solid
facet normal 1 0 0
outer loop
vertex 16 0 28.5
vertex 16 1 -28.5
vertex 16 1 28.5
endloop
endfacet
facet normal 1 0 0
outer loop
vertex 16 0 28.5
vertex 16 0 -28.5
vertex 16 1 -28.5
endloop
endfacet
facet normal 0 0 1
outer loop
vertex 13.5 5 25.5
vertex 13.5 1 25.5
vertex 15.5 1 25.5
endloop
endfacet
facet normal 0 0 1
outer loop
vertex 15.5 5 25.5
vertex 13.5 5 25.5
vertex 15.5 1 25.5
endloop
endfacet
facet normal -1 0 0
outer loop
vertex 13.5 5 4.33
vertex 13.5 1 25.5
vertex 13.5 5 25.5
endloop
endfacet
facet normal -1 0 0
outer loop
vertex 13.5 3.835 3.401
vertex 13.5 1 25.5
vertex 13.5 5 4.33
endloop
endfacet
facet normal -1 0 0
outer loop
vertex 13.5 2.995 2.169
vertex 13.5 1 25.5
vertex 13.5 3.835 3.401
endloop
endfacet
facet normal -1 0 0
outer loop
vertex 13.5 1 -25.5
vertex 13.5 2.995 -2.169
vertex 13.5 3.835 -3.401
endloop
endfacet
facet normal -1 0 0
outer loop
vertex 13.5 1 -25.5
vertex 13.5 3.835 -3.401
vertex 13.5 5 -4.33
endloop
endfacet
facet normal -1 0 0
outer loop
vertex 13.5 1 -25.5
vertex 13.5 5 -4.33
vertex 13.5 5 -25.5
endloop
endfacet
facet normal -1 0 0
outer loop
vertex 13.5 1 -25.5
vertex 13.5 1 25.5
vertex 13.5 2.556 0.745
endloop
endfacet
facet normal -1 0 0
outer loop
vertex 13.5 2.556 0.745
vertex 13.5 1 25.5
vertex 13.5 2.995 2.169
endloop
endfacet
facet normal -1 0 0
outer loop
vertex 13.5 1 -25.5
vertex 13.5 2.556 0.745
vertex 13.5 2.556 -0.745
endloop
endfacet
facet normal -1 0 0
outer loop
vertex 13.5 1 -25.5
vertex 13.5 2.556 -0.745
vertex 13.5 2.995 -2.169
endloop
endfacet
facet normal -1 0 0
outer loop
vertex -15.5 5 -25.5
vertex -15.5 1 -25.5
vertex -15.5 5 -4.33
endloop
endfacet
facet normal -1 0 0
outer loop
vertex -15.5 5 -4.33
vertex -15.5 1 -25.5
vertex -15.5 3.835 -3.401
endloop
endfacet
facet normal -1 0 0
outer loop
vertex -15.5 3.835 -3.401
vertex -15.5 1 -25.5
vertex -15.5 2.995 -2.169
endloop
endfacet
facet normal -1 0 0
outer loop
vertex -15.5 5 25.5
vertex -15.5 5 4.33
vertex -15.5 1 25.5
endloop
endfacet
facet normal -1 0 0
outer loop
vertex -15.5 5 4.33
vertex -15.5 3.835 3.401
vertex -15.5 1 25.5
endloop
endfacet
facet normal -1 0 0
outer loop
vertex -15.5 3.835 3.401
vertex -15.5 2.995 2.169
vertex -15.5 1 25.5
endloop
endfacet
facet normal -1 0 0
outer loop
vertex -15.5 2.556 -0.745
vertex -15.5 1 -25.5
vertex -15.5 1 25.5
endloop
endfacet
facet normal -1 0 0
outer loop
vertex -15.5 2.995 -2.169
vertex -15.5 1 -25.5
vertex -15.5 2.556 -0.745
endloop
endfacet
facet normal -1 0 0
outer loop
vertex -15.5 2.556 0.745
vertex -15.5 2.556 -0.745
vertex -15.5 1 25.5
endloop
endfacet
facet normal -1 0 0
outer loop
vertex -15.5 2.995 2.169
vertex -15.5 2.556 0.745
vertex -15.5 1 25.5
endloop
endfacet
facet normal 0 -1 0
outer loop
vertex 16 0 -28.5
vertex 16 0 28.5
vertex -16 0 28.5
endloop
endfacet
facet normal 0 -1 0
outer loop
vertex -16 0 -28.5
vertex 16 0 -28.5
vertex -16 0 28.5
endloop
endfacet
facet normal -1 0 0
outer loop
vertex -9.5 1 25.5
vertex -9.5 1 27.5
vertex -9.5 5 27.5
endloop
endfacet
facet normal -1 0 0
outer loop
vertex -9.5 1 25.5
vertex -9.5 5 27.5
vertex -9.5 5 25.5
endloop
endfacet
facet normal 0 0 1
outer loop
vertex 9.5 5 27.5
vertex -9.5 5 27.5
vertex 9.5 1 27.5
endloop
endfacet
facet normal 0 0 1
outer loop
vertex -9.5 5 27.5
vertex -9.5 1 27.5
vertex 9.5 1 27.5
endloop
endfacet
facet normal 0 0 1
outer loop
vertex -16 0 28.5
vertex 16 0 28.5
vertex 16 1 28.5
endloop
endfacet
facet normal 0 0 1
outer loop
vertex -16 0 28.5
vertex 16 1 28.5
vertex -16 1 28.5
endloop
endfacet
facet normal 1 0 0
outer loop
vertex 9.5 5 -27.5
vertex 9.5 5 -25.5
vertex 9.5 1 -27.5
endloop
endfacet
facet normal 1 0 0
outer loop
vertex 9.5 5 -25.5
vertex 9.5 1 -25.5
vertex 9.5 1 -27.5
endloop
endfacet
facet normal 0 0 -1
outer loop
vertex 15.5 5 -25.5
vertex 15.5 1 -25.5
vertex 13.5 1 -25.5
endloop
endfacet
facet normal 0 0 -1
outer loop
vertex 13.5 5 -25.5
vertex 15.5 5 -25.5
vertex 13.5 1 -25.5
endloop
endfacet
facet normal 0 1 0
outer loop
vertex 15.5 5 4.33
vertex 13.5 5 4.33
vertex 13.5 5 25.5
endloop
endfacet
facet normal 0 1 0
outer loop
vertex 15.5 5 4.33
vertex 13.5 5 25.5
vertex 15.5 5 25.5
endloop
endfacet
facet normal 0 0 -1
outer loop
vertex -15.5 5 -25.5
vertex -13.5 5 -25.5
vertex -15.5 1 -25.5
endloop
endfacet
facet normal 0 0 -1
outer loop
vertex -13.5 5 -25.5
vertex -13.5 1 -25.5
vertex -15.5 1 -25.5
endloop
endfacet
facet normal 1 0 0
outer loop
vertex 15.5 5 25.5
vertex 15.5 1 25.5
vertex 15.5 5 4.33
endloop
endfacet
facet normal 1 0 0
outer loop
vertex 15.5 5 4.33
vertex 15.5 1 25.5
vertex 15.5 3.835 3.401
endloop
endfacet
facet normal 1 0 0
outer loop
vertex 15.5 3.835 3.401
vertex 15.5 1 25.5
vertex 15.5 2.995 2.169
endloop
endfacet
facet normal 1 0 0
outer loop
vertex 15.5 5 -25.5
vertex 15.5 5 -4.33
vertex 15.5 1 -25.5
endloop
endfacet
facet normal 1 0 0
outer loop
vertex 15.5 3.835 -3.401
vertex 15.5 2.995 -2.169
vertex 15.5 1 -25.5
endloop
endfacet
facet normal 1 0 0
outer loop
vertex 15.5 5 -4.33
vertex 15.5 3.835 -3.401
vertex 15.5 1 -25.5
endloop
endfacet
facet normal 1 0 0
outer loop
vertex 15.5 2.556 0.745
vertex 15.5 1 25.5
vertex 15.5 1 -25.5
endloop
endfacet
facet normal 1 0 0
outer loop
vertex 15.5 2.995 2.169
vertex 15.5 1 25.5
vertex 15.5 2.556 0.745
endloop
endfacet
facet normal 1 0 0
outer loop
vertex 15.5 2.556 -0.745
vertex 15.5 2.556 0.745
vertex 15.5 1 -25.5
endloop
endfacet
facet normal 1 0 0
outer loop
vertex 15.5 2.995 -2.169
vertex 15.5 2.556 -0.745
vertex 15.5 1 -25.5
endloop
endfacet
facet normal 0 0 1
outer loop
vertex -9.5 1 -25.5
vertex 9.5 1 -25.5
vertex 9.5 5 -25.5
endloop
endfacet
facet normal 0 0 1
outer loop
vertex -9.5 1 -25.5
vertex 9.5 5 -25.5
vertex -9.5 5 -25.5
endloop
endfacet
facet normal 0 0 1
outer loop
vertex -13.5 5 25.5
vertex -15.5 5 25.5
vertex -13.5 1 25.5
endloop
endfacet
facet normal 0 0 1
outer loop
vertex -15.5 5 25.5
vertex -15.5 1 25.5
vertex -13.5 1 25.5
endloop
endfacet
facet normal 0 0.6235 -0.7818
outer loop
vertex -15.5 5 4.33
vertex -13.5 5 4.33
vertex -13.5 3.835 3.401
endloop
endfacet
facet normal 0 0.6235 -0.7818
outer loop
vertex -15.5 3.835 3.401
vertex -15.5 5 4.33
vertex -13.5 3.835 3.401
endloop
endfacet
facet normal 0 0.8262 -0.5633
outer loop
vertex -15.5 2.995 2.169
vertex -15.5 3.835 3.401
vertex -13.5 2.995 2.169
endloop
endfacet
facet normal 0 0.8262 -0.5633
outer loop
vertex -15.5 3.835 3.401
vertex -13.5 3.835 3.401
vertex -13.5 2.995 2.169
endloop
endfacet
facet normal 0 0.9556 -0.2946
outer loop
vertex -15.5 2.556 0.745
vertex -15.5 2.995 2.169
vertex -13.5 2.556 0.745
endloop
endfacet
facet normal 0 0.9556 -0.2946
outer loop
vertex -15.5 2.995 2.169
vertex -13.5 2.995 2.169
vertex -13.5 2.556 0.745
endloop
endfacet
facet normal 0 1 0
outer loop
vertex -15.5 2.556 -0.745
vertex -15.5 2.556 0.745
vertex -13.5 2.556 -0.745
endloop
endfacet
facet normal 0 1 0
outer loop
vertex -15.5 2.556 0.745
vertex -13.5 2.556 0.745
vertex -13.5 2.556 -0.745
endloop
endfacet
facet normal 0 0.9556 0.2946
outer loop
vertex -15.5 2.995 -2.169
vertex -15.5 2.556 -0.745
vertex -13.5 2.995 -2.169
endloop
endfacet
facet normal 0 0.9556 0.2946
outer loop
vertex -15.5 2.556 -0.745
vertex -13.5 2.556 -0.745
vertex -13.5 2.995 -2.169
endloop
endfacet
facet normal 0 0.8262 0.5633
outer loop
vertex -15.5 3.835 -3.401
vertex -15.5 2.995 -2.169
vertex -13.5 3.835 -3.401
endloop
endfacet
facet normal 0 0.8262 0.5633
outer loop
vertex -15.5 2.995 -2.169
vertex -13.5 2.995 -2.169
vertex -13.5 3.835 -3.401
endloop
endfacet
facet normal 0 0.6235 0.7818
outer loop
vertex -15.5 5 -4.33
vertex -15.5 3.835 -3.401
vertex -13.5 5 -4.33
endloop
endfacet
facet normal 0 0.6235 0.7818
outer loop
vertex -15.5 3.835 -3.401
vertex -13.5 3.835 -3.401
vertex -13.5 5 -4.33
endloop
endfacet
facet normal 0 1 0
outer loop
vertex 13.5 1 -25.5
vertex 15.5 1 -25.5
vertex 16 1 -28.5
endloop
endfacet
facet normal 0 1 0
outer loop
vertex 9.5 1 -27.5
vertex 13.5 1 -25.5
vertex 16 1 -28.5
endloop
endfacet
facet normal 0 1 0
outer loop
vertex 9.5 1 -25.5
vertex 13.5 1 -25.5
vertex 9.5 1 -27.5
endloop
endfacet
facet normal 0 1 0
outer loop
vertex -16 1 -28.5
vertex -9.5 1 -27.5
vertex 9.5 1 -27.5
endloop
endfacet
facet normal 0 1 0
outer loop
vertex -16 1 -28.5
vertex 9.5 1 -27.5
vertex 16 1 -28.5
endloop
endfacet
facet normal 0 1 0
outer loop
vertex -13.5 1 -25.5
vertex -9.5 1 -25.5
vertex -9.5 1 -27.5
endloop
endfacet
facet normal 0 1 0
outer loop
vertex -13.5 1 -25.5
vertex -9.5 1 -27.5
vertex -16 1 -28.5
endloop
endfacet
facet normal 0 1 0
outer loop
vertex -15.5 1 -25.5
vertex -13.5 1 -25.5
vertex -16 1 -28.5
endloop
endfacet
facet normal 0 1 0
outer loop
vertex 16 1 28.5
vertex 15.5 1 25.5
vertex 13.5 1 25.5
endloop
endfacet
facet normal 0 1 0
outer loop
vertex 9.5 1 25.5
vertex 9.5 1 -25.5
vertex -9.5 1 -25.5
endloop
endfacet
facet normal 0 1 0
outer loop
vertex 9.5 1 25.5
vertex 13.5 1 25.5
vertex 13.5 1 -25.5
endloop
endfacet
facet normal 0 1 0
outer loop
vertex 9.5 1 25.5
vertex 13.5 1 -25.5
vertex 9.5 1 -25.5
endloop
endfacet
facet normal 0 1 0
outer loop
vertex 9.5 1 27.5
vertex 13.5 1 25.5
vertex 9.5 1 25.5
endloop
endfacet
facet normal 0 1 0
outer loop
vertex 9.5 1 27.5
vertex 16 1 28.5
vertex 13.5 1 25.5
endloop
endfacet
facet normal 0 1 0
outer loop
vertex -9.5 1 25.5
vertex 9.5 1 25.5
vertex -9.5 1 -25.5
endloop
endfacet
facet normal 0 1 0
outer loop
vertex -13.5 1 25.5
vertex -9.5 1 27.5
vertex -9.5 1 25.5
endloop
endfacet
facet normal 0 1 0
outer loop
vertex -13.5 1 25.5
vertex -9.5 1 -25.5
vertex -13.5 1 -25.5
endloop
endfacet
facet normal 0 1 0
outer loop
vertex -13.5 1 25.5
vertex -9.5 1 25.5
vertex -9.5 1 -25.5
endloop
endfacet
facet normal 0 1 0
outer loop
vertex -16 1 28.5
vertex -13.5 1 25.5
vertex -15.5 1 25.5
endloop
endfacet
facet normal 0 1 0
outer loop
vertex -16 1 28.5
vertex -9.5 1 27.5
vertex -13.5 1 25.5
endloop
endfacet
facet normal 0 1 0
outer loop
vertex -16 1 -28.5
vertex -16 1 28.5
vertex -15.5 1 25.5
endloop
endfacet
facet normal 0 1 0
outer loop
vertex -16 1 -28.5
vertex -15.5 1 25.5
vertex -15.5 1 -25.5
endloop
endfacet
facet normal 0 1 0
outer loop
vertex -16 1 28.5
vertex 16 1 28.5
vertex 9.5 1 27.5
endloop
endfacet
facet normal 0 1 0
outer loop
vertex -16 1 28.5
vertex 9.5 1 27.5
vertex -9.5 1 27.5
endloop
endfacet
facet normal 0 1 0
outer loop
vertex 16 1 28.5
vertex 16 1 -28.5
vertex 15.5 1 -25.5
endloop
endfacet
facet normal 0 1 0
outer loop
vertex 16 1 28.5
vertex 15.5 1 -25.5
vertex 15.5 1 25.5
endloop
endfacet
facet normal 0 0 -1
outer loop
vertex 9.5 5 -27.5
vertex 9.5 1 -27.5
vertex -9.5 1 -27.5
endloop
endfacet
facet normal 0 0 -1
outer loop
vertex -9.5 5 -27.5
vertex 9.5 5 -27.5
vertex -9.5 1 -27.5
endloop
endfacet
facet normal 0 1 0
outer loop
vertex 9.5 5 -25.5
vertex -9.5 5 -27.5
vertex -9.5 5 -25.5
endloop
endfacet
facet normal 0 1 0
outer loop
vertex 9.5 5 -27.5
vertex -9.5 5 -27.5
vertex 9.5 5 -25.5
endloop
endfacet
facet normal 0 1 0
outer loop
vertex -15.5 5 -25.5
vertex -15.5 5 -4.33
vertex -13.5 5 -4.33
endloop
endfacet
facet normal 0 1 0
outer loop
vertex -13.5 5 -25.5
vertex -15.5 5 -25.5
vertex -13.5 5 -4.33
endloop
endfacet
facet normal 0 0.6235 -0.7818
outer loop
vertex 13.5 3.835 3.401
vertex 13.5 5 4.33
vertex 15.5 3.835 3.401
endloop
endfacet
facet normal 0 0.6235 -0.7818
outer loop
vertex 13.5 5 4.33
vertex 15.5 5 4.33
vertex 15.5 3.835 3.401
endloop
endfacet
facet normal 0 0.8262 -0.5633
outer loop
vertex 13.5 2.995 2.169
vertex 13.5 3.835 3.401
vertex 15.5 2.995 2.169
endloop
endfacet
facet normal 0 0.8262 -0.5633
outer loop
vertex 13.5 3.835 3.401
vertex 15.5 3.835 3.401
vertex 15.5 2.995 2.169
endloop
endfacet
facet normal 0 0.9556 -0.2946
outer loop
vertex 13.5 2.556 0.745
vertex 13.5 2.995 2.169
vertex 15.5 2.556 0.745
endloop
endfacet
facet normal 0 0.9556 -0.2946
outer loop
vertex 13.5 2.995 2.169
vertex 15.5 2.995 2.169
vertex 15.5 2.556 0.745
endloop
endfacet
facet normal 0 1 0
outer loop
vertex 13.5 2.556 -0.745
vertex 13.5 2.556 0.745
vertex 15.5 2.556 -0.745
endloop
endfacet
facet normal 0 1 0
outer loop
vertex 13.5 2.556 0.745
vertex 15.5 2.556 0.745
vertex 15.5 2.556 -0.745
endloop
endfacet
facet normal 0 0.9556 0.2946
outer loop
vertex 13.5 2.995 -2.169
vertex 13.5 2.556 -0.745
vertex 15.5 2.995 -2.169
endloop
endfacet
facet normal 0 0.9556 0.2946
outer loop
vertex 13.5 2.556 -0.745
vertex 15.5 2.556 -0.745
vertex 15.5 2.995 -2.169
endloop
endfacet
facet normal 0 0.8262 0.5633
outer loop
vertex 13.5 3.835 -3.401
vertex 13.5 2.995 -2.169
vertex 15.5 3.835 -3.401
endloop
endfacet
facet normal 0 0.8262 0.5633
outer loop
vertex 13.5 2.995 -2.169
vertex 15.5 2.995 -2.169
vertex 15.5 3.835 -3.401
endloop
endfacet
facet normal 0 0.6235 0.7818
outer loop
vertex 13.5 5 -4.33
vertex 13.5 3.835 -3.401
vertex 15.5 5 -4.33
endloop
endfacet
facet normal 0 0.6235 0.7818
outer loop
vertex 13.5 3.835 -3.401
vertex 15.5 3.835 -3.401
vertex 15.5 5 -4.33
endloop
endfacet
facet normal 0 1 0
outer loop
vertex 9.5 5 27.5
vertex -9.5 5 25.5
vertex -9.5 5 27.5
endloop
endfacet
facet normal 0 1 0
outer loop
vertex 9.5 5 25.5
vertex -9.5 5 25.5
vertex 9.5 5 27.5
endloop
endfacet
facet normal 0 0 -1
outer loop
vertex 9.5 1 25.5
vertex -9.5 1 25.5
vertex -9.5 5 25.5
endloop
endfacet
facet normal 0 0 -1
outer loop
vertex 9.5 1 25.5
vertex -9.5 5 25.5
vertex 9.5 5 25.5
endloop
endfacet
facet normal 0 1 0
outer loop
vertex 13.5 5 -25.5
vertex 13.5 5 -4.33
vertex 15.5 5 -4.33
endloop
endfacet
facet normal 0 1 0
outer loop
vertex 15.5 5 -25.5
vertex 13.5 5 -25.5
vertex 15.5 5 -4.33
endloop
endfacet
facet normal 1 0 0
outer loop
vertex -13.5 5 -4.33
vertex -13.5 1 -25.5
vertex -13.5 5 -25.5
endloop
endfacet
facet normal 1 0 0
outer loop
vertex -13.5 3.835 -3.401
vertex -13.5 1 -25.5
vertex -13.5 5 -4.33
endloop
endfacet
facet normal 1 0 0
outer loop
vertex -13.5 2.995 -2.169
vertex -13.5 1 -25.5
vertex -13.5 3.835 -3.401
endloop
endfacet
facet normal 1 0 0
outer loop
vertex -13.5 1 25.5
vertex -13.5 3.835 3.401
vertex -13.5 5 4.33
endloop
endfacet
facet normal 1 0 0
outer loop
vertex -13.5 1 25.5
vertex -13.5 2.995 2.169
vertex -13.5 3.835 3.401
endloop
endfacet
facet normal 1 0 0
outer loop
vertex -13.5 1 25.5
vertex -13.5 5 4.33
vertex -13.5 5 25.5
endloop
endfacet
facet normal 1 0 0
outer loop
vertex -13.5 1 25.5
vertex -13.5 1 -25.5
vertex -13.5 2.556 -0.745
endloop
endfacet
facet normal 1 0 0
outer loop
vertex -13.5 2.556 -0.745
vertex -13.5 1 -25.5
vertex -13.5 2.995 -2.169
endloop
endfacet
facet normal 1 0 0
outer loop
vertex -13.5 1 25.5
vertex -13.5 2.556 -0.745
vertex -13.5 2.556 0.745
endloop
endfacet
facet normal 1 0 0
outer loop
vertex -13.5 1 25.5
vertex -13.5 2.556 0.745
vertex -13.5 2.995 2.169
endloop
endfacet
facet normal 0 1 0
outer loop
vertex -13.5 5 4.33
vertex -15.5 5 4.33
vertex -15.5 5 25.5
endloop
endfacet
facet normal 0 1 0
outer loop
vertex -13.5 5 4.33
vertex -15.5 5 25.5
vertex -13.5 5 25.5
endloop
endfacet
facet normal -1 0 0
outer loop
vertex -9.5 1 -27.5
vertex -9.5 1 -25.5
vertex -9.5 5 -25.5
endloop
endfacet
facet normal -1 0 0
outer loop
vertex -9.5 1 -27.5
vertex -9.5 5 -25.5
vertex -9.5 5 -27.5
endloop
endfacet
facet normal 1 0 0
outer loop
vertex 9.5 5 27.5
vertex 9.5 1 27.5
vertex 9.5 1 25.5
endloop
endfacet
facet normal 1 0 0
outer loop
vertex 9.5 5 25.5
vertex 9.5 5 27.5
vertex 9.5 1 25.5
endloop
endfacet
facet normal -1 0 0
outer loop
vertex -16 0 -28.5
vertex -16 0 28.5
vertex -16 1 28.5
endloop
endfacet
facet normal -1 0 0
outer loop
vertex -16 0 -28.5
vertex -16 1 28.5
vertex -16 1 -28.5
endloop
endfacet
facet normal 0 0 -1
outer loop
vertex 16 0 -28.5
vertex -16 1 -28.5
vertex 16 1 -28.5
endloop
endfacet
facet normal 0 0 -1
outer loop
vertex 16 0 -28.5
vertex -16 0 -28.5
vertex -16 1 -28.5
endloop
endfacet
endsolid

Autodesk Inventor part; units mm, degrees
ref_plane "YZ Plane" through (0, 0, 0) normal (1, 0, 0) x (0, 1, 0)
ref_plane "XZ Plane" through (0, 0, 0) normal (0, 1, 0) x (-1, 0, 0)
ref_plane "XY Plane" through (0, 0, 0) normal (0, 0, 1) x (1, 0, 0)
sketch "Sketch1" plane through (0, 0, 0) normal (0, 1, 0) x (-1, 0, 0)
  line L0 (16, -28.5) -> (-16, -28.5)
  line L1 (-16, -28.5) -> (-16, 28.5)
  line L2 (-16, 28.5) -> (16, 28.5)
  line L3 (16, 28.5) -> (16, -28.5)
  line L4 (16, -28.5) -> (-16, 28.5) construction
  line L5 (-16, -28.5) -> (16, 28.5) construction
  point P0 (0, 0)
  dimension "d0" = 32
  dimension "d1" = 57
extrude "Extrusion1" add sketch "Sketch1" along normal blind 1
sketch "Sketch2" plane through (0, 1, 0) normal (0, 1, 0) x (1, 0, 0)
  line L0 (-9.5, -27.5) -> (9.5, -27.5)
  line L1 (15.5, -25.5) -> (15.5, 25.5)
  line L2 (9.5, 27.5) -> (-9.5, 27.5)
  line L3 (-15.5, 25.5) -> (-15.5, -25.5)
  line L4 (-15.5, -27.5) -> (15.5, 27.5) construction
  line L5 (15.5, -27.5) -> (-15.5, 27.5) construction
  line L6 (13.5, -25.5) -> (13.5, 25.5)
  line L7 (-13.5, 25.5) -> (-13.5, -25.5)
  line L8 (-16, -28.5) -> (16, -28.5) projected
  line L9 (-9.5, -28.4306) -> (-9.5, -25.5)
  line L10 (9.5, 25.5) -> (9.5, 27.5)
  line L11 (-9.5, -16.8548) -> (-9.5, 16.8548)
  line L12 (-9.5, 25.5) -> (-9.5, 28.5928)
  line L13 (9.5, -28.5) -> (9.5, -25.5)
  line L14 (9.5, -16.8548) -> (9.5, 16.8548)
  line L15 (13.5, -25.5) -> (15.5, -25.5)
  line L16 (15.5, 25.5) -> (13.5, 25.5)
  line L17 (9.5, 25.5) -> (-9.5, 25.5)
  line L18 (-13.5, 25.5) -> (-15.5, 25.5)
  line L19 (-15.5, -25.5) -> (-13.5, -25.5)
  line L20 (-9.5, -25.5) -> (9.5, -25.5)
  point P0 (0, 0)
  dimension "d4" = 31
  dimension "d5" = 55
  dimension "d6" = 2
extrude "Extrusion2" add sketch "Sketch2" along normal blind 4
sketch "Sketch3" plane through (15.5, 1, 25.5) normal (1, 0, 0) x (0, 0, -1)
  circle A0 centre (25.5, 6.5) radius 5
  line L0 (-3, 0) -> (54, 0) projected
  point P0 (25.5, -1)
  dimension "d11" = 10
  dimension "d12" = 6.5
extrude "Extrusion3" cut sketch "Sketch3" against normal through all
sketch "Sketch4" plane through (0, 0, 0) normal (0, -1, 0) x (1, 0, 0)
  line L0 (7.5, -7.5) -> (-7.5, -7.5)
  line L1 (-7.5, -7.5) -> (-7.5, 7.5)
  line L2 (-7.5, 7.5) -> (7.5, 7.5)
  line L3 (7.5, 7.5) -> (7.5, -7.5)
  line L4 (7.5, -7.5) -> (-7.5, 7.5) construction
  line L5 (-7.5, -7.5) -> (7.5, 7.5) construction
  point P0 (0, 0)
  dimension "d15" = 15
  dimension "d16" = 15
extrude "Extrusion4" [suppressed]
sketch "Sketch5" plane through (0, 1, 0) normal (0, 1, 0) x (1, 0, 0)
  line L0 (-13.5, -25.5) -> (-15.5, -25.5) projected
  line L1 (-15.5, -25.5) -> (-15.5, 25.5) projected
  line L2 (-15.5, 25.5) -> (-13.5, 25.5) projected
  line L3 (-13.5, 25.5) -> (-13.5, -25.5) projected
  line L4 (9.5, -27.5) -> (-9.5, -27.5) projected
  line L5 (-9.5, -27.5) -> (-9.5, -25.5) projected
  line L6 (-9.5, -25.5) -> (9.5, -25.5) projected
  line L7 (9.5, -25.5) -> (9.5, -27.5) projected
  line L8 (9.5, 27.5) -> (9.5, 25.5) projected
  line L9 (9.5, 25.5) -> (-9.5, 25.5) projected
  line L10 (-9.5, 25.5) -> (-9.5, 27.5) projected
  line L11 (-9.5, 27.5) -> (9.5, 27.5) projected
  line L12 (13.5, 25.5) -> (15.5, 25.5) projected
  line L13 (15.5, 25.5) -> (15.5, -25.5) projected
  line L14 (15.5, -25.5) -> (13.5, -25.5) projected
  line L15 (13.5, -25.5) -> (13.5, 25.5) projected
  line L16 (16, 28.5) -> (-16, 28.5) projected
  line L17 (-16, 28.5) -> (-16, -28.5) projected
  line L18 (-16, -28.5) -> (16, -28.5) projected
  line L19 (16, -28.5) -> (16, 28.5) projected
  line L20 (-8.5, -8.5) -> (8.5, -8.5)
  line L21 (8.5, -8.5) -> (8.5, 8.5)
  line L22 (8.5, 8.5) -> (-8.5, 8.5)
  line L23 (-8.5, 8.5) -> (-8.5, -8.5)
  point P0 (0, 0)
extrude "Extrusion5" [suppressed]
properties part number "hull_cover_closed"
